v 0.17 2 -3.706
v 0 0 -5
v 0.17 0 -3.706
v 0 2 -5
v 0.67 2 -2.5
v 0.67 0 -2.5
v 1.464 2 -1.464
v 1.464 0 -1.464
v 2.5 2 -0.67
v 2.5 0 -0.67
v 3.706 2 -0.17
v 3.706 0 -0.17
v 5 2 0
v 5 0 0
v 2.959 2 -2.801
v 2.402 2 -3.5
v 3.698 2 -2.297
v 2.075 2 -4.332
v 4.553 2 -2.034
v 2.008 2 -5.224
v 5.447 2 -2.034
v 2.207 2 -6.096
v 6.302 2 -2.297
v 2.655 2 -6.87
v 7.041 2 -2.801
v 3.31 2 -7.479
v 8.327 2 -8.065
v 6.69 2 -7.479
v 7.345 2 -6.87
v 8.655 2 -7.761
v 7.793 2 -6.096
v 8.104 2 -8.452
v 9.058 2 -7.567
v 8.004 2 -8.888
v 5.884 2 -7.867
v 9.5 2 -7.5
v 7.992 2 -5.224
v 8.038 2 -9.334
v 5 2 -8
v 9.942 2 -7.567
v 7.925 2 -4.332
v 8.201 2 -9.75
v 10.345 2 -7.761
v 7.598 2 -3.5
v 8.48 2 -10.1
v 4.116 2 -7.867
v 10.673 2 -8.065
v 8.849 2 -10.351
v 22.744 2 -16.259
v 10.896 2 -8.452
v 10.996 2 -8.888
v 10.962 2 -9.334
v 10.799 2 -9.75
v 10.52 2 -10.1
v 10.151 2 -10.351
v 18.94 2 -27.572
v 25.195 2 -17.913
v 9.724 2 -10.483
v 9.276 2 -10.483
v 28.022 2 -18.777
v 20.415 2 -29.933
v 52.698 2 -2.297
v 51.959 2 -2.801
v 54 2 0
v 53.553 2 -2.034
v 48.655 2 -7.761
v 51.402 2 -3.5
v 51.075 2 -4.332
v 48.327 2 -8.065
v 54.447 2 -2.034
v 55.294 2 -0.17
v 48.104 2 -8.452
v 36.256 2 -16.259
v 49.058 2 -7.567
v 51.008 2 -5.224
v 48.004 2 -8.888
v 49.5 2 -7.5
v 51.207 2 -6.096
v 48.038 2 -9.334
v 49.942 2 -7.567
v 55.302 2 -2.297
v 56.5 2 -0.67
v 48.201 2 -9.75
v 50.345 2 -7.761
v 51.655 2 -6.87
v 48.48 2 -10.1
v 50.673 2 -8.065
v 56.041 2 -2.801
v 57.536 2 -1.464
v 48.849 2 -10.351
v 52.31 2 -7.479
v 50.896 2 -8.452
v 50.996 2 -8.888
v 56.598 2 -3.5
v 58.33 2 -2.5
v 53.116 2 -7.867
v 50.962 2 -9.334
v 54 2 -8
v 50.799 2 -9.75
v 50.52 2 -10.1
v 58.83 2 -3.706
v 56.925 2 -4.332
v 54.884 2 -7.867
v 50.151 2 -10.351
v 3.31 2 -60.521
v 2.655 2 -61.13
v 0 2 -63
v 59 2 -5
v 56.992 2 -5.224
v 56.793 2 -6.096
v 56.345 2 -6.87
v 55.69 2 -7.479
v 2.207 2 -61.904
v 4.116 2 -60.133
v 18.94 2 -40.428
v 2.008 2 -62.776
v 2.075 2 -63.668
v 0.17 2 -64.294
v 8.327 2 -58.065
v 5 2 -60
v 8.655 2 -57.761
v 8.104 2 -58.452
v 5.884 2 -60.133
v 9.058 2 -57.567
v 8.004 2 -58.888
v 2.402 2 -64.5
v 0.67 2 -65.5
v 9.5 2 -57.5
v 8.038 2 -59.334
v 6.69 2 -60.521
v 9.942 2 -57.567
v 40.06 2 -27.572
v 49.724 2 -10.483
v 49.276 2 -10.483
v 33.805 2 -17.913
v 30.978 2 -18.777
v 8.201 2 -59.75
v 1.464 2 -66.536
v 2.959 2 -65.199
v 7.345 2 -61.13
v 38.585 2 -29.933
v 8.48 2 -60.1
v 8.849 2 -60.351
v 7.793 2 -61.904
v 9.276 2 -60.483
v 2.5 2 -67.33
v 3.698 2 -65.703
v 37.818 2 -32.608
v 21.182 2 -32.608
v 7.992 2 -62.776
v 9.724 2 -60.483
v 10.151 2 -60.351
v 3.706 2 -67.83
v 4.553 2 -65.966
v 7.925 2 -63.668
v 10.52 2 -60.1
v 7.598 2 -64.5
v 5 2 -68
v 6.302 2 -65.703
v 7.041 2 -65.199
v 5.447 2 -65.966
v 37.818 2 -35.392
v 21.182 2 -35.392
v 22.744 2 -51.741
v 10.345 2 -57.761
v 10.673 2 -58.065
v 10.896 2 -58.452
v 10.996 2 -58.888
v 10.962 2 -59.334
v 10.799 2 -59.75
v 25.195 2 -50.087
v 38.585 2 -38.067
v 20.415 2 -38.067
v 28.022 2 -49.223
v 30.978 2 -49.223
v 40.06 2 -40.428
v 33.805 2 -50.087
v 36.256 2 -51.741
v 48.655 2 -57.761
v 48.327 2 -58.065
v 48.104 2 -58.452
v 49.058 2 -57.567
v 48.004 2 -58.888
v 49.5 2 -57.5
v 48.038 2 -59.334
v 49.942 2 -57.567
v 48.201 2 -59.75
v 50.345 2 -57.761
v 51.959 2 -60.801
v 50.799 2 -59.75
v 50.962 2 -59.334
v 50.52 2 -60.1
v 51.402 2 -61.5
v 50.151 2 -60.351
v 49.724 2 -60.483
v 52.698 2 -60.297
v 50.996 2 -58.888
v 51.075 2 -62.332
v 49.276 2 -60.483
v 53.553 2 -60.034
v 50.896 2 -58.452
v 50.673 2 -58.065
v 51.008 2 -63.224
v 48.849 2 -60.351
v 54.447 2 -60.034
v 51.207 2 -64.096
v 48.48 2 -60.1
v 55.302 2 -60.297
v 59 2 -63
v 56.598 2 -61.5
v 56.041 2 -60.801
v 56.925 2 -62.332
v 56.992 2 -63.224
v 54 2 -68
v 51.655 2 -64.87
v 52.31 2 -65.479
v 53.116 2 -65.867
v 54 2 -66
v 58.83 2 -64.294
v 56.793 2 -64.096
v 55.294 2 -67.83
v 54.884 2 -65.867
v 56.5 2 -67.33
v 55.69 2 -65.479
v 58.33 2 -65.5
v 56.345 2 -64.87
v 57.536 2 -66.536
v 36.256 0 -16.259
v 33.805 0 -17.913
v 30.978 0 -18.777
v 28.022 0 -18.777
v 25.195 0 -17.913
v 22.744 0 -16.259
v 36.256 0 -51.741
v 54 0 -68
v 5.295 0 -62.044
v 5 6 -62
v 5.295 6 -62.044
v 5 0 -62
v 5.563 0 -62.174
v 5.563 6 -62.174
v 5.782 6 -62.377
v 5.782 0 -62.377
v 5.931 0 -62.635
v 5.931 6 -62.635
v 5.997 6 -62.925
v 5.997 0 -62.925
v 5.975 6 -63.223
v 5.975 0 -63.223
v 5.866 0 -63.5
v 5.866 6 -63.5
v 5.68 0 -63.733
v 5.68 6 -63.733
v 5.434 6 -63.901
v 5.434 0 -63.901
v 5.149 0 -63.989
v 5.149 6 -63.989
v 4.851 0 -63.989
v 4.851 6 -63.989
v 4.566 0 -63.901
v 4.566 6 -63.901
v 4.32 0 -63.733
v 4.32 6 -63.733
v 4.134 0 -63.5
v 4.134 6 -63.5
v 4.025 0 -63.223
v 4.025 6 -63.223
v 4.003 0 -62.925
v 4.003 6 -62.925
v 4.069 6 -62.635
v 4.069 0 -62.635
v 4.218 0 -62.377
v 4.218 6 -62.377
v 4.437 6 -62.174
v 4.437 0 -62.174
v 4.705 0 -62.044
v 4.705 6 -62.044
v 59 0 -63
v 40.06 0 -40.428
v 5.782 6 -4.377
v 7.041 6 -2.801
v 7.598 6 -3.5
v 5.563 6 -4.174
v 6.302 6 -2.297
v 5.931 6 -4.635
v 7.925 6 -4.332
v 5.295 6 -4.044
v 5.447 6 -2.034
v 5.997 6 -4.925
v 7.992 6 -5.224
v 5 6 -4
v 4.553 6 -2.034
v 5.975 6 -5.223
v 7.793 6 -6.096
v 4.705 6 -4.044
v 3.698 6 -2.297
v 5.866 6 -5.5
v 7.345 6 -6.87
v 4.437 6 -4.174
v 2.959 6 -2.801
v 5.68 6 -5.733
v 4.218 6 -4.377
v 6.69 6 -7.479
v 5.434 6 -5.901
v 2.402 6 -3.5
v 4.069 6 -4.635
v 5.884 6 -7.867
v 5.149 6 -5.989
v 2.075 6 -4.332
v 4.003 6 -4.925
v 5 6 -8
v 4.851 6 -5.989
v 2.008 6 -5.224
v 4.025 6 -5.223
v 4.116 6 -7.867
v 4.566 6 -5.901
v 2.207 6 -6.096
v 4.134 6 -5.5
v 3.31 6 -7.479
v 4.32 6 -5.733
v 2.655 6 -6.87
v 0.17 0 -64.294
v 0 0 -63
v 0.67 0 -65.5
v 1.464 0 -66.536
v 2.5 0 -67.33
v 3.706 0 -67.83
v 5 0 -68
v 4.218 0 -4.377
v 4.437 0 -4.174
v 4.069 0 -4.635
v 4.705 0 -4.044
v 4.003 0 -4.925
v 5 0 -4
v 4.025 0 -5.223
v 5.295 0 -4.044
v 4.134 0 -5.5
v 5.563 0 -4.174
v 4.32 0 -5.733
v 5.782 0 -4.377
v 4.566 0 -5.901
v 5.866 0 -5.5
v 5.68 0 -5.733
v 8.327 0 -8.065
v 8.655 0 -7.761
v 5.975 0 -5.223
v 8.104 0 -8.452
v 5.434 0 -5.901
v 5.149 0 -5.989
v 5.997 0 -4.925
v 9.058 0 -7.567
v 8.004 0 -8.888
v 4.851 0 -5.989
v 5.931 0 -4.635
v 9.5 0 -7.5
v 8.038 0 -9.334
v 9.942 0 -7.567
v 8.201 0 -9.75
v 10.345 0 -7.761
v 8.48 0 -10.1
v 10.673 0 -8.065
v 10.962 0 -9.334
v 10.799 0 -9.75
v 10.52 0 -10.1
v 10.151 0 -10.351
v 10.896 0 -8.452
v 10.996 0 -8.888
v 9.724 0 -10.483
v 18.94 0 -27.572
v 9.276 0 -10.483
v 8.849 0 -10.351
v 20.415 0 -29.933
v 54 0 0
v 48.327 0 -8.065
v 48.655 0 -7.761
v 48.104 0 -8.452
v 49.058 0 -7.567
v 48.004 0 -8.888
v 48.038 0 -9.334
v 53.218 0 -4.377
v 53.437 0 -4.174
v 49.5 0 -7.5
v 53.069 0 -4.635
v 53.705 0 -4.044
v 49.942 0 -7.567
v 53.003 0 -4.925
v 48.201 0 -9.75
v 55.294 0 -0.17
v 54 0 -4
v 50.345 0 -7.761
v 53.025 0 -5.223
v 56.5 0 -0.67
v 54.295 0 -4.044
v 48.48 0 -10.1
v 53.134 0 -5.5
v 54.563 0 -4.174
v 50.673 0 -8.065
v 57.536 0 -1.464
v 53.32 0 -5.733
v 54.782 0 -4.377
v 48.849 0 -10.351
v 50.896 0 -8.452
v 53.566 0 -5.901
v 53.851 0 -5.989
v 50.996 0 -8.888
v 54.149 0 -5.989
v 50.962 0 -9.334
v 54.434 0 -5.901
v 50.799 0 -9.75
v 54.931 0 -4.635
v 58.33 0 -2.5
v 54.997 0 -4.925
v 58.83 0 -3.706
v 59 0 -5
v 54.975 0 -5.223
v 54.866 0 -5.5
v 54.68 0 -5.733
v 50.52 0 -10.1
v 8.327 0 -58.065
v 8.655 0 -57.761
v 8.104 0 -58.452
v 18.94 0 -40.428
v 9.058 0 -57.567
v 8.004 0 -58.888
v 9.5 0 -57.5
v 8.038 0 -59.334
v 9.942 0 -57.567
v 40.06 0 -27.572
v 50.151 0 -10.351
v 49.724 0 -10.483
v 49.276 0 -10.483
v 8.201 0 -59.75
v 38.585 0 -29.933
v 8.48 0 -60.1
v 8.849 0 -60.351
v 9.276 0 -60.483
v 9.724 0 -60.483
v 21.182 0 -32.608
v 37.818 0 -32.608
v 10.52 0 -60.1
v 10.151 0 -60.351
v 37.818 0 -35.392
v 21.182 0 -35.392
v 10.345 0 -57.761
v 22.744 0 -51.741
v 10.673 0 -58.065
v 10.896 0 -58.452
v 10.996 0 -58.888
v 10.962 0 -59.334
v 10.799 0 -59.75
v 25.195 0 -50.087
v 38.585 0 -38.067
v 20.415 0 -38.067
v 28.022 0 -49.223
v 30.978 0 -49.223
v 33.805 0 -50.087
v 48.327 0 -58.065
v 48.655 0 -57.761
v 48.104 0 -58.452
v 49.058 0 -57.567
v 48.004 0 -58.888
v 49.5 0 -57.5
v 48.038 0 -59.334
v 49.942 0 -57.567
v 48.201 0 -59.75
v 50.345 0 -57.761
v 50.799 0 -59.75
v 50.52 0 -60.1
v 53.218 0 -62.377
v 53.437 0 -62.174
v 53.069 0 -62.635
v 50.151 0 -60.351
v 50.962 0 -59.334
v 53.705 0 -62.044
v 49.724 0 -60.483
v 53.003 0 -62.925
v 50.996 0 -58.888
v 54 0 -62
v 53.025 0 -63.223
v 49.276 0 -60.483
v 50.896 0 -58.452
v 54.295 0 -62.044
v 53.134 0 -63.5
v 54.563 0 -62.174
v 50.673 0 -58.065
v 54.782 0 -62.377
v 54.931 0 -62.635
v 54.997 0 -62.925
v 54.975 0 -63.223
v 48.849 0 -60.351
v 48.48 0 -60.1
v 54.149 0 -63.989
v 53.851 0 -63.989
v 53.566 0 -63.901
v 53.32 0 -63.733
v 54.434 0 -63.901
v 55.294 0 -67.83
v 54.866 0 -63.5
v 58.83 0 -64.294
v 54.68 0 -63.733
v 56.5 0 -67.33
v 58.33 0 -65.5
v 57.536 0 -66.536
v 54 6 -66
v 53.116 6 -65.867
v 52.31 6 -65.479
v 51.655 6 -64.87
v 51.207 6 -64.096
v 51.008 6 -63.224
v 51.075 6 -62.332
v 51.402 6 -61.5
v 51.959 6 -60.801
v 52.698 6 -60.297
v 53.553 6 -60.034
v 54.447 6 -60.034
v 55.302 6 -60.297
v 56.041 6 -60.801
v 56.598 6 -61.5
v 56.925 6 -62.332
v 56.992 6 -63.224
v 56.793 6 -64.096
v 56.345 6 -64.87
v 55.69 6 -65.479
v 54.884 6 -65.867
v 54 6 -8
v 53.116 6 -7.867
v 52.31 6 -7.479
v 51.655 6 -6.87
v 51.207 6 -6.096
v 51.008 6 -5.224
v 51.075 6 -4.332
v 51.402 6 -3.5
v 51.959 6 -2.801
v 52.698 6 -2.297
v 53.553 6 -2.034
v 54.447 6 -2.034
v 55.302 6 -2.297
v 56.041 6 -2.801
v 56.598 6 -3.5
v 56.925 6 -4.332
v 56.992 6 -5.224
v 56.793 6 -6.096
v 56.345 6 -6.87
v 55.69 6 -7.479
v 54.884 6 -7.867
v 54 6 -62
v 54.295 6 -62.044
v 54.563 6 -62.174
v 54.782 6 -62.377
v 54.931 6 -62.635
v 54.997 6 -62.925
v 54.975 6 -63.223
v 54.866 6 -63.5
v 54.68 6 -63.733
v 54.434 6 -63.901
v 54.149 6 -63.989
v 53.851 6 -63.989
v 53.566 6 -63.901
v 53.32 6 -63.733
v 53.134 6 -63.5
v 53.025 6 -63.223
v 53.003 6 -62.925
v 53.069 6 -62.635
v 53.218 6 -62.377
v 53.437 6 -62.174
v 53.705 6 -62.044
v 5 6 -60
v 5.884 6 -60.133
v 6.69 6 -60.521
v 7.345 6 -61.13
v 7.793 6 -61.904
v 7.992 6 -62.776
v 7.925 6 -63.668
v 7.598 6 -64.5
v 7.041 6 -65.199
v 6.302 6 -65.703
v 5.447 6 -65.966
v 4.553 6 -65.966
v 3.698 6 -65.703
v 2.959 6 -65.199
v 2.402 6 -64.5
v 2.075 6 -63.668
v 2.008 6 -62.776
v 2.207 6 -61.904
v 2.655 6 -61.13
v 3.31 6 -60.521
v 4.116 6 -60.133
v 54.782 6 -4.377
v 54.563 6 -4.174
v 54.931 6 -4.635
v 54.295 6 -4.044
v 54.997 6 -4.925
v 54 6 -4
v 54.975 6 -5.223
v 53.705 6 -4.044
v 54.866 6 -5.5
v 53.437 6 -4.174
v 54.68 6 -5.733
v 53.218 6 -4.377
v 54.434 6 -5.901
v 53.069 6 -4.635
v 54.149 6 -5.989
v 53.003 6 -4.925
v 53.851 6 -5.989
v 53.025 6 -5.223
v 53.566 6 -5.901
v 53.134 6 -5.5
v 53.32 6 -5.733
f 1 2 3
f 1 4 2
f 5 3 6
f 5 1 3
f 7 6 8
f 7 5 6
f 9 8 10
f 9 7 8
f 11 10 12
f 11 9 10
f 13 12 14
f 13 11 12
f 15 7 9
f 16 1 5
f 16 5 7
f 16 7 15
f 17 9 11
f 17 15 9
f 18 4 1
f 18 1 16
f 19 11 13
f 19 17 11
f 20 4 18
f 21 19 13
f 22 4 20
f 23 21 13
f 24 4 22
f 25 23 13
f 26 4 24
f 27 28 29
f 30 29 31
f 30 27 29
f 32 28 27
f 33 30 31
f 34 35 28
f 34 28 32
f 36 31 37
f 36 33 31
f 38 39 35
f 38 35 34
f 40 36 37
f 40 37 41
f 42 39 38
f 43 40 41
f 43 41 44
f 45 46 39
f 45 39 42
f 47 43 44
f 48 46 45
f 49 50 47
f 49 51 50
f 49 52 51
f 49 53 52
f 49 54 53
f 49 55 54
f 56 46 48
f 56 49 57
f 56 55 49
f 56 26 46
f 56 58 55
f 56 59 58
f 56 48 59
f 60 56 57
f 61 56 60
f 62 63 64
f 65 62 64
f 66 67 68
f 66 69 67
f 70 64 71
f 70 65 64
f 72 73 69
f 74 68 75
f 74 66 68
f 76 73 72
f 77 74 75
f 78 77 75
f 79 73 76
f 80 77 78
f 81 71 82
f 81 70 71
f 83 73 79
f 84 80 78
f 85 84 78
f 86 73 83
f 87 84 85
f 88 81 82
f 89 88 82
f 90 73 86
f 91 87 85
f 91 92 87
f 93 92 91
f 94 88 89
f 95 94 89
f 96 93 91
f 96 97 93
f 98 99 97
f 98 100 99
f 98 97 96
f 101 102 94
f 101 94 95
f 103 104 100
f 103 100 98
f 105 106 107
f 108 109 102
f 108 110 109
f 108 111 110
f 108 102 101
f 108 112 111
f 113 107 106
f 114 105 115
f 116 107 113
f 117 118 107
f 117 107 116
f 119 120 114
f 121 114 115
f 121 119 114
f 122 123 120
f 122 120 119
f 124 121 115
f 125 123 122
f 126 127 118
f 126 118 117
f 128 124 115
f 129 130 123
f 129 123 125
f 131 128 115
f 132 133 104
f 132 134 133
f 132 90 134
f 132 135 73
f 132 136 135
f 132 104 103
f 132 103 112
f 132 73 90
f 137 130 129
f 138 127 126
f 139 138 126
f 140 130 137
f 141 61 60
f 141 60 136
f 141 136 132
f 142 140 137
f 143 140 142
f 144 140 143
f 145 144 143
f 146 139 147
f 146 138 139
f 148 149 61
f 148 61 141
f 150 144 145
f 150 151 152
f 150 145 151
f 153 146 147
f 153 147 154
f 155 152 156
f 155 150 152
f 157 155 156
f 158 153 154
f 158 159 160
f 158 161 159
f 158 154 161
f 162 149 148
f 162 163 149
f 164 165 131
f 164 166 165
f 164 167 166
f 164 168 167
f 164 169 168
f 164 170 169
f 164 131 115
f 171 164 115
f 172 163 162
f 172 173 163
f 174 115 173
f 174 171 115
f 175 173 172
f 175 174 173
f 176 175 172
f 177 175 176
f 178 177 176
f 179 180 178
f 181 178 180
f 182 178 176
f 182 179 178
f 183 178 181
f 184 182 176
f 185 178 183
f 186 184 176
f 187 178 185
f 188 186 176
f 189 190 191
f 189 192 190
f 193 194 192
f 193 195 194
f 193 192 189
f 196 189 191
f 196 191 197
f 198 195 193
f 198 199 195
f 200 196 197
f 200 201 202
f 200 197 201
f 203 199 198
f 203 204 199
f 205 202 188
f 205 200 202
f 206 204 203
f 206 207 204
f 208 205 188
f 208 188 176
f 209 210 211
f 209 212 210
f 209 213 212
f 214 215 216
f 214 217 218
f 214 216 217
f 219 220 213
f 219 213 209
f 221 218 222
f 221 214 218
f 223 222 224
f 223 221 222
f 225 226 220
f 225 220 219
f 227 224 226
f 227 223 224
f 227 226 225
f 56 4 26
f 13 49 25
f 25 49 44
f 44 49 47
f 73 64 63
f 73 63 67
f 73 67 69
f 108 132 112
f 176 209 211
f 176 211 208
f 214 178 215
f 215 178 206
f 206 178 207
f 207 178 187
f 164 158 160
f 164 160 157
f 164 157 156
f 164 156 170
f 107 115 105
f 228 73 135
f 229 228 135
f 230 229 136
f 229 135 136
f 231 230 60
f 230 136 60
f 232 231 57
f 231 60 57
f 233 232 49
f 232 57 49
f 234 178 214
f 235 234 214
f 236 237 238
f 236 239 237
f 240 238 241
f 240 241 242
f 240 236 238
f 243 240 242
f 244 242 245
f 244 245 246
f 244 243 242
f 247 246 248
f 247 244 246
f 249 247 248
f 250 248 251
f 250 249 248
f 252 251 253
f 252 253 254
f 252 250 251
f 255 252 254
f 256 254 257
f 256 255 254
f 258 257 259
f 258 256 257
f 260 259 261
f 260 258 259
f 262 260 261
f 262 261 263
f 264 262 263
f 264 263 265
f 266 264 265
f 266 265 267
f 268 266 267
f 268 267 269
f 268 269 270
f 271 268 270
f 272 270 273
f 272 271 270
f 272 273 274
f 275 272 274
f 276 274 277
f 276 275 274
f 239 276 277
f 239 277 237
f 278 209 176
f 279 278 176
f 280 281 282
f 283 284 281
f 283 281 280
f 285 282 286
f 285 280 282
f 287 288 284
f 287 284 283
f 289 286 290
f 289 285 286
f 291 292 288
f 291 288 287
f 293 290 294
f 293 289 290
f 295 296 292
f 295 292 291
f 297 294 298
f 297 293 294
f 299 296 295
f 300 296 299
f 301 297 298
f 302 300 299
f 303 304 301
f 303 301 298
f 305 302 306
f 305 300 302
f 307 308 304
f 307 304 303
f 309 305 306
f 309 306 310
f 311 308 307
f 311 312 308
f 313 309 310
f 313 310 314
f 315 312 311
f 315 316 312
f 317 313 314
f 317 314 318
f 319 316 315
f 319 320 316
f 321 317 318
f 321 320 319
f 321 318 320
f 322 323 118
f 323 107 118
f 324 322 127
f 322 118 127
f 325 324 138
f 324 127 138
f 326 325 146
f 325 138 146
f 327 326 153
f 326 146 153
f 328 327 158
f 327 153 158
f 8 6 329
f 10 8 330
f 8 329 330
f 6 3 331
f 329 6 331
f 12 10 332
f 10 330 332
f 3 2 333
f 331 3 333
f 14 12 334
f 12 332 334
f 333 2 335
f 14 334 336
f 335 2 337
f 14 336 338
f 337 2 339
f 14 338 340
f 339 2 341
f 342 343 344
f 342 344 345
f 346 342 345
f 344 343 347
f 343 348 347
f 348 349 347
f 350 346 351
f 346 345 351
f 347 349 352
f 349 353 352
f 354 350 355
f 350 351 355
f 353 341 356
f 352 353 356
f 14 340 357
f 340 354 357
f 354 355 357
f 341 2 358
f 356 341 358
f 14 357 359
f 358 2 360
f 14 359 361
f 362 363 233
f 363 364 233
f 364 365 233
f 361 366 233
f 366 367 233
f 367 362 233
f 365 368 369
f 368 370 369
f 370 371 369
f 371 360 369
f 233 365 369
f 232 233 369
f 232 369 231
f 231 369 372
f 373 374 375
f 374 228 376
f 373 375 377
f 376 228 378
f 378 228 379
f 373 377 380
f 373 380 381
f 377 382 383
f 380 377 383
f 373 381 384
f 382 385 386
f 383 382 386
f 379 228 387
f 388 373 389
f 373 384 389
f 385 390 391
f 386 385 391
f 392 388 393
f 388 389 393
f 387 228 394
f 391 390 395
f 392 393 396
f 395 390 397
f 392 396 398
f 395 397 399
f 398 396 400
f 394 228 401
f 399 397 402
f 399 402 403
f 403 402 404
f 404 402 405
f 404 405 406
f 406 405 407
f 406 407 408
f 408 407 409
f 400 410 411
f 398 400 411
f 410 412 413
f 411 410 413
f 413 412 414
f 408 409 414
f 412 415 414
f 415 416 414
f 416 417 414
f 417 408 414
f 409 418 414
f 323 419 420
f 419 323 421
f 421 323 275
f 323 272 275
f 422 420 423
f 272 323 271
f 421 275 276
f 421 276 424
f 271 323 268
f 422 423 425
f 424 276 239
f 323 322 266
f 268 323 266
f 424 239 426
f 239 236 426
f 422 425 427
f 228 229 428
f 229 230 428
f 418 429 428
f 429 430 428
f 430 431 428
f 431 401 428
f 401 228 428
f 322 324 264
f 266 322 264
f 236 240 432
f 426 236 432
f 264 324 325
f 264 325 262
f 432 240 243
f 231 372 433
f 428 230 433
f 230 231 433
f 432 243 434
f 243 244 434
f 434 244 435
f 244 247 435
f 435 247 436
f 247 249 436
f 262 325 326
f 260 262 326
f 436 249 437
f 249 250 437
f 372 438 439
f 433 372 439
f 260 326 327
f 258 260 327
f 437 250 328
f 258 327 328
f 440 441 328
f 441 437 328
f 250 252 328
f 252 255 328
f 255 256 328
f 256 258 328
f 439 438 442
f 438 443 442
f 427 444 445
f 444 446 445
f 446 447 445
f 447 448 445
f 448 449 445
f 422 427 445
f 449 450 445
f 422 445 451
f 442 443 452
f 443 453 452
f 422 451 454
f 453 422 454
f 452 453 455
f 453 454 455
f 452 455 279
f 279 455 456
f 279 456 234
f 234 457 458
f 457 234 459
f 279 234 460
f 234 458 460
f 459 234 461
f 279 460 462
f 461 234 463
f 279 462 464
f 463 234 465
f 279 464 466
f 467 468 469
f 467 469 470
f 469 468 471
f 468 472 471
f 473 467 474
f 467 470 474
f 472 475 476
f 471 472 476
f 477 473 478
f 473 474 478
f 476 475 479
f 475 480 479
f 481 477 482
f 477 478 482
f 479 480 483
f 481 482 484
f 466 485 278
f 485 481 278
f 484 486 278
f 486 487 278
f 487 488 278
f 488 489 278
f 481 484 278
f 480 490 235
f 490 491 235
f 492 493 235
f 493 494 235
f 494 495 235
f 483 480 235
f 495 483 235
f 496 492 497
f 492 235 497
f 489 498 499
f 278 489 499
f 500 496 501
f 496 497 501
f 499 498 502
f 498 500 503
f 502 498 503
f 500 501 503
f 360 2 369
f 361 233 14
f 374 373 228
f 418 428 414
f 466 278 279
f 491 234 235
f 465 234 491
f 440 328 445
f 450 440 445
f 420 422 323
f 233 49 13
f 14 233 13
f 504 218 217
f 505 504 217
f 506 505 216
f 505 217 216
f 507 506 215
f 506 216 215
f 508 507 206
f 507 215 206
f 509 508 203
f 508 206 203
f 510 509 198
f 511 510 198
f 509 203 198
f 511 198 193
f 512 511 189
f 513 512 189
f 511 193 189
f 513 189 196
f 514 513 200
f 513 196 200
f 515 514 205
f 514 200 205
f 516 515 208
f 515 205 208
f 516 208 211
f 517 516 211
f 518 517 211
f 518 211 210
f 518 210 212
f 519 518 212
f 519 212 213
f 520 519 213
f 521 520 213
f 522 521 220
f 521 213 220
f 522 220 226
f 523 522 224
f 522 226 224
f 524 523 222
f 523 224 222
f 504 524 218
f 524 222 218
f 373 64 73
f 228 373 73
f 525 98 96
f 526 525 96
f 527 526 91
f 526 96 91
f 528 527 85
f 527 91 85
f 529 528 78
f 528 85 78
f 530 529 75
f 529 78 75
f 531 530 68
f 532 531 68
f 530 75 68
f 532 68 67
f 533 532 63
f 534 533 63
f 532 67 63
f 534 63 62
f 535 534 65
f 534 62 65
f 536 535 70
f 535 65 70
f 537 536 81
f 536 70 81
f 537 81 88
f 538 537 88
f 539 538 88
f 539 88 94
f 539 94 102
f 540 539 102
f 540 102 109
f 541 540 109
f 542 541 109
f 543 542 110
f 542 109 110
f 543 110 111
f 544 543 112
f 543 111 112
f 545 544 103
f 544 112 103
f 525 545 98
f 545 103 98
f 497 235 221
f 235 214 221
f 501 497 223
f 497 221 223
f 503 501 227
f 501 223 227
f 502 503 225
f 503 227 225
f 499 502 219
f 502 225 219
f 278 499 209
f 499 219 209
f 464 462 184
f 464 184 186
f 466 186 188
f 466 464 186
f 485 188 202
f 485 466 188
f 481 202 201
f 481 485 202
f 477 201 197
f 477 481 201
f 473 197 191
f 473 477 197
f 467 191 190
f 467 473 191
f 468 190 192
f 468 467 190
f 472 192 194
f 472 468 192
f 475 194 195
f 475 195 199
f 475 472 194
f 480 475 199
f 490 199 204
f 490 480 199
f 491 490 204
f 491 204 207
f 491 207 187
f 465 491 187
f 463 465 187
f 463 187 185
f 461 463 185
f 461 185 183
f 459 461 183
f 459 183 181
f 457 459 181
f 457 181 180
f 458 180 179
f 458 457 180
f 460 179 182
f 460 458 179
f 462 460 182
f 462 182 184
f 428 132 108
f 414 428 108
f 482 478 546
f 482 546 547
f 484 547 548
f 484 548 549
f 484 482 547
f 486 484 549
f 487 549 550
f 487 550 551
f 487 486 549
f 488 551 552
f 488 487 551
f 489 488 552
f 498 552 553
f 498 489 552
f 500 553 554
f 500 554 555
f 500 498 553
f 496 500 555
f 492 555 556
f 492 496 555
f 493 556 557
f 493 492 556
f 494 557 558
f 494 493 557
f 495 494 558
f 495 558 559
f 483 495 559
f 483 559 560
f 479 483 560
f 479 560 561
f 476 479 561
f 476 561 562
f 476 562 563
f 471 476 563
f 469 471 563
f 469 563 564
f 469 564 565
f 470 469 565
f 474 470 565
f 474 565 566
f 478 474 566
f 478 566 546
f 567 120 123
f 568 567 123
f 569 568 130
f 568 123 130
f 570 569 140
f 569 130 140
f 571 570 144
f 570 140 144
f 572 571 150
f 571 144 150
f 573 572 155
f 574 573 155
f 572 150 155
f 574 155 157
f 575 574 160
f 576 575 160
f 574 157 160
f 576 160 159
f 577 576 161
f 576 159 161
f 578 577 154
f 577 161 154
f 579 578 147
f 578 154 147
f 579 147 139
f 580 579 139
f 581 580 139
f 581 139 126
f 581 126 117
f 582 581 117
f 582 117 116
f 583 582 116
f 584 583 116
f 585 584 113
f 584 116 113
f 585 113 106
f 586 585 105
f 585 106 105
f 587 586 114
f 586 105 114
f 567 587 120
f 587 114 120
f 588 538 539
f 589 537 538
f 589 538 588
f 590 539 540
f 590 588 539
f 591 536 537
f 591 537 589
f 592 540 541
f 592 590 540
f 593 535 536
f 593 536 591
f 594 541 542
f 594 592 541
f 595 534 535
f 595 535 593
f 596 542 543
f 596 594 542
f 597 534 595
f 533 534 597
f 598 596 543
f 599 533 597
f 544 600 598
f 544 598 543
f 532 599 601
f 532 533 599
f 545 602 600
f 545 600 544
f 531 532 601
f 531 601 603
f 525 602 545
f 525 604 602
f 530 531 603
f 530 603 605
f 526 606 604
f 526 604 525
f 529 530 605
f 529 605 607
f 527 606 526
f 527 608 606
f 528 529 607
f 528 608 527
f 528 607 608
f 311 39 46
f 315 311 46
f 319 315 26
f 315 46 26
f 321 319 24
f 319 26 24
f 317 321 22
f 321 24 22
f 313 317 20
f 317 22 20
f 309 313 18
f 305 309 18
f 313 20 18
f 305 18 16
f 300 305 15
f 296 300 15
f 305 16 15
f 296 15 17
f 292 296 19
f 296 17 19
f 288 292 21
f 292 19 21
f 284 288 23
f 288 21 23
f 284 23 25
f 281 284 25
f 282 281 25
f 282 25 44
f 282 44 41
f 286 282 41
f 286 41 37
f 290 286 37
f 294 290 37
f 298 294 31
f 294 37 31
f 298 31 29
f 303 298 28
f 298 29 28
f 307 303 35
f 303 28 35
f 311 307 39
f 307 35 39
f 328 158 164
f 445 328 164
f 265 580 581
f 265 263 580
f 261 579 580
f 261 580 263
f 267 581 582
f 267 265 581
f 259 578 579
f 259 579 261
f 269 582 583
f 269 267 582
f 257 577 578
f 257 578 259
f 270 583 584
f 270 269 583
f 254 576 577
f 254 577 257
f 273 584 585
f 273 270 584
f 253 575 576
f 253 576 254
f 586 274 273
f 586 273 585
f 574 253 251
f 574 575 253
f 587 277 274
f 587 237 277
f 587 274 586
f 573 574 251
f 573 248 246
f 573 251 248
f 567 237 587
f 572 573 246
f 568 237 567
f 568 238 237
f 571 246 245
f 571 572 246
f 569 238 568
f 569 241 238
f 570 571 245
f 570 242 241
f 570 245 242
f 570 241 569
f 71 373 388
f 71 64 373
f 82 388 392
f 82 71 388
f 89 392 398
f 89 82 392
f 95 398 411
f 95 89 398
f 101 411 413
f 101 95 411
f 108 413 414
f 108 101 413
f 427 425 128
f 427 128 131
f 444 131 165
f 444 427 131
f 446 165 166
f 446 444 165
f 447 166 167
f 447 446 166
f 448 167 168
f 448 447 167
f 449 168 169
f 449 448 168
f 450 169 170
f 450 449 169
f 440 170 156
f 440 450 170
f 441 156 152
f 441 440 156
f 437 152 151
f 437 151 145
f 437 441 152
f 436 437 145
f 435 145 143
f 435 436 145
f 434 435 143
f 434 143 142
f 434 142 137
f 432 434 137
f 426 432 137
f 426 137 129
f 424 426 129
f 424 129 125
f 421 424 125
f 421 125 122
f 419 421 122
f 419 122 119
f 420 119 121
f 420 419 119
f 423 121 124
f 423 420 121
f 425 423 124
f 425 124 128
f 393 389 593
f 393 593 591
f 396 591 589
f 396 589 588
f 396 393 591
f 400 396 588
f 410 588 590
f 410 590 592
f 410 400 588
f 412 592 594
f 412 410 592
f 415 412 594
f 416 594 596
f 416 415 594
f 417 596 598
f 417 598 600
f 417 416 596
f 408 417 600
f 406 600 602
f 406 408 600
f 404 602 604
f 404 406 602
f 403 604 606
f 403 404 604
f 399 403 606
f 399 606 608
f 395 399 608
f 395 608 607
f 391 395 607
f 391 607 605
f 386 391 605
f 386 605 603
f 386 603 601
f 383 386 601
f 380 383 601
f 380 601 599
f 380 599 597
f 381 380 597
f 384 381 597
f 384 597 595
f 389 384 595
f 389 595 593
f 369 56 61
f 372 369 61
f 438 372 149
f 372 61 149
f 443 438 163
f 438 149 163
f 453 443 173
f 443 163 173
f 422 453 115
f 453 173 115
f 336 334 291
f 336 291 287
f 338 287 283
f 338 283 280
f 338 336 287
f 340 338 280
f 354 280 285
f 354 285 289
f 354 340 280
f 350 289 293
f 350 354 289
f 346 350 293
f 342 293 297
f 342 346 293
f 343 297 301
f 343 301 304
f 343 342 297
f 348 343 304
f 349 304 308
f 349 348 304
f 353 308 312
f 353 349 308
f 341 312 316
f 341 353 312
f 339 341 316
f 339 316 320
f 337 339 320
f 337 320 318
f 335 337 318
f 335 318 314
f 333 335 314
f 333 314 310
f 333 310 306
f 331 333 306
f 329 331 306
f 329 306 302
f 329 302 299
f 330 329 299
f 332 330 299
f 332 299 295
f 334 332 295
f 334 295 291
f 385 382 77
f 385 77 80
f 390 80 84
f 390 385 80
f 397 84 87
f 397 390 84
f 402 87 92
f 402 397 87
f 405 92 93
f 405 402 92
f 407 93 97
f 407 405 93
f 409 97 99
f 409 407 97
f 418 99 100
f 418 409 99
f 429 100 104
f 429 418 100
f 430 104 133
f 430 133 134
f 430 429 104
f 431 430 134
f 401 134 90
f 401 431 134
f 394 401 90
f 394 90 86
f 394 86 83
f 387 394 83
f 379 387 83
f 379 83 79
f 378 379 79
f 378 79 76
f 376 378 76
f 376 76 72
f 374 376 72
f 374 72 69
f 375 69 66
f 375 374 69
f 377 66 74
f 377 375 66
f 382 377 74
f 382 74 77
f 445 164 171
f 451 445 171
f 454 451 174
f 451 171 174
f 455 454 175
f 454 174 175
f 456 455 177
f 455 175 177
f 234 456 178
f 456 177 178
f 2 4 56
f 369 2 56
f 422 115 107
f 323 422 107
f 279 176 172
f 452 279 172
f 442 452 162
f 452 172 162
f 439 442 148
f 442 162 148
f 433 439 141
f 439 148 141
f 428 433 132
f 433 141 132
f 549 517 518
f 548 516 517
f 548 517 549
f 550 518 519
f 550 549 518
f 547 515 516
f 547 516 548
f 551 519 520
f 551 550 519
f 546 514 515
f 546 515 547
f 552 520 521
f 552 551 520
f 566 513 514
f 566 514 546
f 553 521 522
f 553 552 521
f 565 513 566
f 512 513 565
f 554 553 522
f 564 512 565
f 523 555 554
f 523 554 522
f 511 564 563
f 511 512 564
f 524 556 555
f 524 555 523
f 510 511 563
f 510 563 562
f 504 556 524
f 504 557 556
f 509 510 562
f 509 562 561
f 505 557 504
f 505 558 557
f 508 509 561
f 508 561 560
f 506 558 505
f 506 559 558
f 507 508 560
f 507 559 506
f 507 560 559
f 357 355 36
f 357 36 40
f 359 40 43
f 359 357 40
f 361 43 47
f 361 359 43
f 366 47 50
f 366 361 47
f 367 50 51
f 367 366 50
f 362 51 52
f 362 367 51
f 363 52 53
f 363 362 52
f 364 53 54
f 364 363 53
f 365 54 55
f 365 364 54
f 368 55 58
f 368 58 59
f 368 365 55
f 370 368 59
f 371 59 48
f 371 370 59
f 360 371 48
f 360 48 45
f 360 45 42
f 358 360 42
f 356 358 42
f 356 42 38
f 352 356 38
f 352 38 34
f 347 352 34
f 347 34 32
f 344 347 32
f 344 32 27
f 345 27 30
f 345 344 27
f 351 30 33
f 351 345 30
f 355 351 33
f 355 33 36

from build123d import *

# Parameters (mm, degrees)
SKETCH1_W           = 59
SKETCH1_H           = 68
SKETCH1_R           = 1
SKETCH1_R_2         = 1.5
BOSS_EXTRUDE1_DEPTH = 2
FILLET1_R           = 5
CUT_EXTRUDE1_DEPTH  = 2
SKETCH3_R           = 3
SKETCH3_R_2         = 1
BOSS_EXTRUDE2_DEPTH = 4


with BuildPart() as part:
    # Sketch1 → Boss-Extrude1 (new body)
    with BuildSketch(Plane(origin=(0, 0, 0), x_dir=(1, 0, 0), z_dir=(0, 1, 0))):
        with Locations((29.5, 34)):
            Rectangle(SKETCH1_W, SKETCH1_H)
        with Locations(Location((5, 5, 0), (0, 0, 270))):
            Circle(SKETCH1_R, mode=Mode.SUBTRACT)
        with Locations(Location((54, 5, 0), (0, 0, 270))):
            Circle(SKETCH1_R, mode=Mode.SUBTRACT)
        with Locations(Location((5, 63, 0), (0, 0, 270))):
            Circle(SKETCH1_R, mode=Mode.SUBTRACT)
        with Locations(Location((54, 63, 0), (0, 0, 270))):
            Circle(SKETCH1_R, mode=Mode.SUBTRACT)
        with Locations(Location((9.5, 59, 0), (0, 0, 270))):
            Circle(SKETCH1_R_2, mode=Mode.SUBTRACT)
        with Locations(Location((49.5, 59, 0), (0, 0, 270))):
            Circle(SKETCH1_R_2, mode=Mode.SUBTRACT)
        with Locations(Location((49.5, 9, 0), (0, 0, 270))):
            Circle(SKETCH1_R_2, mode=Mode.SUBTRACT)
        with Locations(Location((9.5, 9, 0), (0, 0, 270))):
            Circle(SKETCH1_R_2, mode=Mode.SUBTRACT)
    extrude(amount=BOSS_EXTRUDE1_DEPTH)

    # Fillet1
    fillet1_edges = [part.edges().sort_by_distance(p)[0] for p in [
        (0, 1, -68),
        (59, 1, -68),
        (59, 1, 0),
        (0, 1, 0),
    ]]
    fillet(fillet1_edges, radius=FILLET1_R)

    # Sketch2 → Cut-Extrude1 (cut)
    with BuildSketch(Plane(origin=(0, 2, 0), x_dir=(1, 0, 0), z_dir=(0, 1, 0))):
        with BuildLine():
            Line((0, 5), (18.940260842, 27.572123903))
            ThreePointArc((18.940260842, 27.572123903), (21.279816411, 34), (18.940260842, 40.427876097))
            Line((18.940260842, 40.427876097), (0, 63))
            Line((0, 63), (0, 5))
        make_face()
        with BuildLine():
            Line((54, 0), (36.255902076, 16.259470082))
            ThreePointArc((36.255902076, 16.259470082), (29.5, 18.886696714), (22.744097924, 16.259470082))
            Line((22.744097924, 16.259470082), (5, 0))
            Line((5, 0), (54, 0))
        make_face()
        with BuildLine():
            Line((54, 68), (5, 68))
            Line((5, 68), (22.744097924, 51.740529918))
            ThreePointArc((22.744097924, 51.740529918), (29.5, 49.113303286), (36.255902076, 51.740529918))
            Line((36.255902076, 51.740529918), (54, 68))
        make_face()
        with BuildLine():
            Line((59, 5), (59, 63))
            Line((59, 63), (40.059739158, 40.427876097))
            ThreePointArc((40.059739158, 40.427876097), (37.720183589, 34), (40.059739158, 27.572123903))
            Line((40.059739158, 27.572123903), (59, 5))
        make_face()
    extrude(amount=-CUT_EXTRUDE1_DEPTH, mode=Mode.SUBTRACT)

    # Sketch3 → Boss-Extrude2 (add)
    # profile 1 of 4: a face of its own
    with BuildSketch(Plane(origin=(0, 2, 0), x_dir=(1, 0, 0), z_dir=(0, 1, 0))):
        with Locations(Location((5, 63, 0), (0, 0, 270))):
            Circle(SKETCH3_R)
        with Locations(Location((5, 63, 0), (0, 0, 270))):
            Circle(SKETCH3_R_2, mode=Mode.SUBTRACT)
    # profile 2 of 4: a face of its own
    with BuildSketch(Plane(origin=(0, 2, 0), x_dir=(1, 0, 0), z_dir=(0, 1, 0))):
        with Locations(Location((54, 63, 0), (0, 0, 90))):
            Circle(SKETCH3_R)
        with Locations(Location((54, 63, 0), (0, 0, 270))):
            Circle(SKETCH3_R_2, mode=Mode.SUBTRACT)
    # profile 3 of 4: a face of its own
    with BuildSketch(Plane(origin=(0, 2, 0), x_dir=(1, 0, 0), z_dir=(0, 1, 0))):
        with Locations(Location((54, 5, 0), (0, 0, 90))):
            Circle(SKETCH3_R)
        with Locations(Location((54, 5, 0), (0, 0, 270))):
            Circle(SKETCH3_R_2, mode=Mode.SUBTRACT)
    # profile 4 of 4: a face of its own
    with BuildSketch(Plane(origin=(0, 2, 0), x_dir=(1, 0, 0), z_dir=(0, 1, 0))):
        with Locations(Location((5, 5, 0), (0, 0, 90))):
            Circle(SKETCH3_R)
        with Locations(Location((5, 5, 0), (0, 0, 270))):
            Circle(SKETCH3_R_2, mode=Mode.SUBTRACT)
    extrude(amount=BOSS_EXTRUDE2_DEPTH)


solid = part.part
